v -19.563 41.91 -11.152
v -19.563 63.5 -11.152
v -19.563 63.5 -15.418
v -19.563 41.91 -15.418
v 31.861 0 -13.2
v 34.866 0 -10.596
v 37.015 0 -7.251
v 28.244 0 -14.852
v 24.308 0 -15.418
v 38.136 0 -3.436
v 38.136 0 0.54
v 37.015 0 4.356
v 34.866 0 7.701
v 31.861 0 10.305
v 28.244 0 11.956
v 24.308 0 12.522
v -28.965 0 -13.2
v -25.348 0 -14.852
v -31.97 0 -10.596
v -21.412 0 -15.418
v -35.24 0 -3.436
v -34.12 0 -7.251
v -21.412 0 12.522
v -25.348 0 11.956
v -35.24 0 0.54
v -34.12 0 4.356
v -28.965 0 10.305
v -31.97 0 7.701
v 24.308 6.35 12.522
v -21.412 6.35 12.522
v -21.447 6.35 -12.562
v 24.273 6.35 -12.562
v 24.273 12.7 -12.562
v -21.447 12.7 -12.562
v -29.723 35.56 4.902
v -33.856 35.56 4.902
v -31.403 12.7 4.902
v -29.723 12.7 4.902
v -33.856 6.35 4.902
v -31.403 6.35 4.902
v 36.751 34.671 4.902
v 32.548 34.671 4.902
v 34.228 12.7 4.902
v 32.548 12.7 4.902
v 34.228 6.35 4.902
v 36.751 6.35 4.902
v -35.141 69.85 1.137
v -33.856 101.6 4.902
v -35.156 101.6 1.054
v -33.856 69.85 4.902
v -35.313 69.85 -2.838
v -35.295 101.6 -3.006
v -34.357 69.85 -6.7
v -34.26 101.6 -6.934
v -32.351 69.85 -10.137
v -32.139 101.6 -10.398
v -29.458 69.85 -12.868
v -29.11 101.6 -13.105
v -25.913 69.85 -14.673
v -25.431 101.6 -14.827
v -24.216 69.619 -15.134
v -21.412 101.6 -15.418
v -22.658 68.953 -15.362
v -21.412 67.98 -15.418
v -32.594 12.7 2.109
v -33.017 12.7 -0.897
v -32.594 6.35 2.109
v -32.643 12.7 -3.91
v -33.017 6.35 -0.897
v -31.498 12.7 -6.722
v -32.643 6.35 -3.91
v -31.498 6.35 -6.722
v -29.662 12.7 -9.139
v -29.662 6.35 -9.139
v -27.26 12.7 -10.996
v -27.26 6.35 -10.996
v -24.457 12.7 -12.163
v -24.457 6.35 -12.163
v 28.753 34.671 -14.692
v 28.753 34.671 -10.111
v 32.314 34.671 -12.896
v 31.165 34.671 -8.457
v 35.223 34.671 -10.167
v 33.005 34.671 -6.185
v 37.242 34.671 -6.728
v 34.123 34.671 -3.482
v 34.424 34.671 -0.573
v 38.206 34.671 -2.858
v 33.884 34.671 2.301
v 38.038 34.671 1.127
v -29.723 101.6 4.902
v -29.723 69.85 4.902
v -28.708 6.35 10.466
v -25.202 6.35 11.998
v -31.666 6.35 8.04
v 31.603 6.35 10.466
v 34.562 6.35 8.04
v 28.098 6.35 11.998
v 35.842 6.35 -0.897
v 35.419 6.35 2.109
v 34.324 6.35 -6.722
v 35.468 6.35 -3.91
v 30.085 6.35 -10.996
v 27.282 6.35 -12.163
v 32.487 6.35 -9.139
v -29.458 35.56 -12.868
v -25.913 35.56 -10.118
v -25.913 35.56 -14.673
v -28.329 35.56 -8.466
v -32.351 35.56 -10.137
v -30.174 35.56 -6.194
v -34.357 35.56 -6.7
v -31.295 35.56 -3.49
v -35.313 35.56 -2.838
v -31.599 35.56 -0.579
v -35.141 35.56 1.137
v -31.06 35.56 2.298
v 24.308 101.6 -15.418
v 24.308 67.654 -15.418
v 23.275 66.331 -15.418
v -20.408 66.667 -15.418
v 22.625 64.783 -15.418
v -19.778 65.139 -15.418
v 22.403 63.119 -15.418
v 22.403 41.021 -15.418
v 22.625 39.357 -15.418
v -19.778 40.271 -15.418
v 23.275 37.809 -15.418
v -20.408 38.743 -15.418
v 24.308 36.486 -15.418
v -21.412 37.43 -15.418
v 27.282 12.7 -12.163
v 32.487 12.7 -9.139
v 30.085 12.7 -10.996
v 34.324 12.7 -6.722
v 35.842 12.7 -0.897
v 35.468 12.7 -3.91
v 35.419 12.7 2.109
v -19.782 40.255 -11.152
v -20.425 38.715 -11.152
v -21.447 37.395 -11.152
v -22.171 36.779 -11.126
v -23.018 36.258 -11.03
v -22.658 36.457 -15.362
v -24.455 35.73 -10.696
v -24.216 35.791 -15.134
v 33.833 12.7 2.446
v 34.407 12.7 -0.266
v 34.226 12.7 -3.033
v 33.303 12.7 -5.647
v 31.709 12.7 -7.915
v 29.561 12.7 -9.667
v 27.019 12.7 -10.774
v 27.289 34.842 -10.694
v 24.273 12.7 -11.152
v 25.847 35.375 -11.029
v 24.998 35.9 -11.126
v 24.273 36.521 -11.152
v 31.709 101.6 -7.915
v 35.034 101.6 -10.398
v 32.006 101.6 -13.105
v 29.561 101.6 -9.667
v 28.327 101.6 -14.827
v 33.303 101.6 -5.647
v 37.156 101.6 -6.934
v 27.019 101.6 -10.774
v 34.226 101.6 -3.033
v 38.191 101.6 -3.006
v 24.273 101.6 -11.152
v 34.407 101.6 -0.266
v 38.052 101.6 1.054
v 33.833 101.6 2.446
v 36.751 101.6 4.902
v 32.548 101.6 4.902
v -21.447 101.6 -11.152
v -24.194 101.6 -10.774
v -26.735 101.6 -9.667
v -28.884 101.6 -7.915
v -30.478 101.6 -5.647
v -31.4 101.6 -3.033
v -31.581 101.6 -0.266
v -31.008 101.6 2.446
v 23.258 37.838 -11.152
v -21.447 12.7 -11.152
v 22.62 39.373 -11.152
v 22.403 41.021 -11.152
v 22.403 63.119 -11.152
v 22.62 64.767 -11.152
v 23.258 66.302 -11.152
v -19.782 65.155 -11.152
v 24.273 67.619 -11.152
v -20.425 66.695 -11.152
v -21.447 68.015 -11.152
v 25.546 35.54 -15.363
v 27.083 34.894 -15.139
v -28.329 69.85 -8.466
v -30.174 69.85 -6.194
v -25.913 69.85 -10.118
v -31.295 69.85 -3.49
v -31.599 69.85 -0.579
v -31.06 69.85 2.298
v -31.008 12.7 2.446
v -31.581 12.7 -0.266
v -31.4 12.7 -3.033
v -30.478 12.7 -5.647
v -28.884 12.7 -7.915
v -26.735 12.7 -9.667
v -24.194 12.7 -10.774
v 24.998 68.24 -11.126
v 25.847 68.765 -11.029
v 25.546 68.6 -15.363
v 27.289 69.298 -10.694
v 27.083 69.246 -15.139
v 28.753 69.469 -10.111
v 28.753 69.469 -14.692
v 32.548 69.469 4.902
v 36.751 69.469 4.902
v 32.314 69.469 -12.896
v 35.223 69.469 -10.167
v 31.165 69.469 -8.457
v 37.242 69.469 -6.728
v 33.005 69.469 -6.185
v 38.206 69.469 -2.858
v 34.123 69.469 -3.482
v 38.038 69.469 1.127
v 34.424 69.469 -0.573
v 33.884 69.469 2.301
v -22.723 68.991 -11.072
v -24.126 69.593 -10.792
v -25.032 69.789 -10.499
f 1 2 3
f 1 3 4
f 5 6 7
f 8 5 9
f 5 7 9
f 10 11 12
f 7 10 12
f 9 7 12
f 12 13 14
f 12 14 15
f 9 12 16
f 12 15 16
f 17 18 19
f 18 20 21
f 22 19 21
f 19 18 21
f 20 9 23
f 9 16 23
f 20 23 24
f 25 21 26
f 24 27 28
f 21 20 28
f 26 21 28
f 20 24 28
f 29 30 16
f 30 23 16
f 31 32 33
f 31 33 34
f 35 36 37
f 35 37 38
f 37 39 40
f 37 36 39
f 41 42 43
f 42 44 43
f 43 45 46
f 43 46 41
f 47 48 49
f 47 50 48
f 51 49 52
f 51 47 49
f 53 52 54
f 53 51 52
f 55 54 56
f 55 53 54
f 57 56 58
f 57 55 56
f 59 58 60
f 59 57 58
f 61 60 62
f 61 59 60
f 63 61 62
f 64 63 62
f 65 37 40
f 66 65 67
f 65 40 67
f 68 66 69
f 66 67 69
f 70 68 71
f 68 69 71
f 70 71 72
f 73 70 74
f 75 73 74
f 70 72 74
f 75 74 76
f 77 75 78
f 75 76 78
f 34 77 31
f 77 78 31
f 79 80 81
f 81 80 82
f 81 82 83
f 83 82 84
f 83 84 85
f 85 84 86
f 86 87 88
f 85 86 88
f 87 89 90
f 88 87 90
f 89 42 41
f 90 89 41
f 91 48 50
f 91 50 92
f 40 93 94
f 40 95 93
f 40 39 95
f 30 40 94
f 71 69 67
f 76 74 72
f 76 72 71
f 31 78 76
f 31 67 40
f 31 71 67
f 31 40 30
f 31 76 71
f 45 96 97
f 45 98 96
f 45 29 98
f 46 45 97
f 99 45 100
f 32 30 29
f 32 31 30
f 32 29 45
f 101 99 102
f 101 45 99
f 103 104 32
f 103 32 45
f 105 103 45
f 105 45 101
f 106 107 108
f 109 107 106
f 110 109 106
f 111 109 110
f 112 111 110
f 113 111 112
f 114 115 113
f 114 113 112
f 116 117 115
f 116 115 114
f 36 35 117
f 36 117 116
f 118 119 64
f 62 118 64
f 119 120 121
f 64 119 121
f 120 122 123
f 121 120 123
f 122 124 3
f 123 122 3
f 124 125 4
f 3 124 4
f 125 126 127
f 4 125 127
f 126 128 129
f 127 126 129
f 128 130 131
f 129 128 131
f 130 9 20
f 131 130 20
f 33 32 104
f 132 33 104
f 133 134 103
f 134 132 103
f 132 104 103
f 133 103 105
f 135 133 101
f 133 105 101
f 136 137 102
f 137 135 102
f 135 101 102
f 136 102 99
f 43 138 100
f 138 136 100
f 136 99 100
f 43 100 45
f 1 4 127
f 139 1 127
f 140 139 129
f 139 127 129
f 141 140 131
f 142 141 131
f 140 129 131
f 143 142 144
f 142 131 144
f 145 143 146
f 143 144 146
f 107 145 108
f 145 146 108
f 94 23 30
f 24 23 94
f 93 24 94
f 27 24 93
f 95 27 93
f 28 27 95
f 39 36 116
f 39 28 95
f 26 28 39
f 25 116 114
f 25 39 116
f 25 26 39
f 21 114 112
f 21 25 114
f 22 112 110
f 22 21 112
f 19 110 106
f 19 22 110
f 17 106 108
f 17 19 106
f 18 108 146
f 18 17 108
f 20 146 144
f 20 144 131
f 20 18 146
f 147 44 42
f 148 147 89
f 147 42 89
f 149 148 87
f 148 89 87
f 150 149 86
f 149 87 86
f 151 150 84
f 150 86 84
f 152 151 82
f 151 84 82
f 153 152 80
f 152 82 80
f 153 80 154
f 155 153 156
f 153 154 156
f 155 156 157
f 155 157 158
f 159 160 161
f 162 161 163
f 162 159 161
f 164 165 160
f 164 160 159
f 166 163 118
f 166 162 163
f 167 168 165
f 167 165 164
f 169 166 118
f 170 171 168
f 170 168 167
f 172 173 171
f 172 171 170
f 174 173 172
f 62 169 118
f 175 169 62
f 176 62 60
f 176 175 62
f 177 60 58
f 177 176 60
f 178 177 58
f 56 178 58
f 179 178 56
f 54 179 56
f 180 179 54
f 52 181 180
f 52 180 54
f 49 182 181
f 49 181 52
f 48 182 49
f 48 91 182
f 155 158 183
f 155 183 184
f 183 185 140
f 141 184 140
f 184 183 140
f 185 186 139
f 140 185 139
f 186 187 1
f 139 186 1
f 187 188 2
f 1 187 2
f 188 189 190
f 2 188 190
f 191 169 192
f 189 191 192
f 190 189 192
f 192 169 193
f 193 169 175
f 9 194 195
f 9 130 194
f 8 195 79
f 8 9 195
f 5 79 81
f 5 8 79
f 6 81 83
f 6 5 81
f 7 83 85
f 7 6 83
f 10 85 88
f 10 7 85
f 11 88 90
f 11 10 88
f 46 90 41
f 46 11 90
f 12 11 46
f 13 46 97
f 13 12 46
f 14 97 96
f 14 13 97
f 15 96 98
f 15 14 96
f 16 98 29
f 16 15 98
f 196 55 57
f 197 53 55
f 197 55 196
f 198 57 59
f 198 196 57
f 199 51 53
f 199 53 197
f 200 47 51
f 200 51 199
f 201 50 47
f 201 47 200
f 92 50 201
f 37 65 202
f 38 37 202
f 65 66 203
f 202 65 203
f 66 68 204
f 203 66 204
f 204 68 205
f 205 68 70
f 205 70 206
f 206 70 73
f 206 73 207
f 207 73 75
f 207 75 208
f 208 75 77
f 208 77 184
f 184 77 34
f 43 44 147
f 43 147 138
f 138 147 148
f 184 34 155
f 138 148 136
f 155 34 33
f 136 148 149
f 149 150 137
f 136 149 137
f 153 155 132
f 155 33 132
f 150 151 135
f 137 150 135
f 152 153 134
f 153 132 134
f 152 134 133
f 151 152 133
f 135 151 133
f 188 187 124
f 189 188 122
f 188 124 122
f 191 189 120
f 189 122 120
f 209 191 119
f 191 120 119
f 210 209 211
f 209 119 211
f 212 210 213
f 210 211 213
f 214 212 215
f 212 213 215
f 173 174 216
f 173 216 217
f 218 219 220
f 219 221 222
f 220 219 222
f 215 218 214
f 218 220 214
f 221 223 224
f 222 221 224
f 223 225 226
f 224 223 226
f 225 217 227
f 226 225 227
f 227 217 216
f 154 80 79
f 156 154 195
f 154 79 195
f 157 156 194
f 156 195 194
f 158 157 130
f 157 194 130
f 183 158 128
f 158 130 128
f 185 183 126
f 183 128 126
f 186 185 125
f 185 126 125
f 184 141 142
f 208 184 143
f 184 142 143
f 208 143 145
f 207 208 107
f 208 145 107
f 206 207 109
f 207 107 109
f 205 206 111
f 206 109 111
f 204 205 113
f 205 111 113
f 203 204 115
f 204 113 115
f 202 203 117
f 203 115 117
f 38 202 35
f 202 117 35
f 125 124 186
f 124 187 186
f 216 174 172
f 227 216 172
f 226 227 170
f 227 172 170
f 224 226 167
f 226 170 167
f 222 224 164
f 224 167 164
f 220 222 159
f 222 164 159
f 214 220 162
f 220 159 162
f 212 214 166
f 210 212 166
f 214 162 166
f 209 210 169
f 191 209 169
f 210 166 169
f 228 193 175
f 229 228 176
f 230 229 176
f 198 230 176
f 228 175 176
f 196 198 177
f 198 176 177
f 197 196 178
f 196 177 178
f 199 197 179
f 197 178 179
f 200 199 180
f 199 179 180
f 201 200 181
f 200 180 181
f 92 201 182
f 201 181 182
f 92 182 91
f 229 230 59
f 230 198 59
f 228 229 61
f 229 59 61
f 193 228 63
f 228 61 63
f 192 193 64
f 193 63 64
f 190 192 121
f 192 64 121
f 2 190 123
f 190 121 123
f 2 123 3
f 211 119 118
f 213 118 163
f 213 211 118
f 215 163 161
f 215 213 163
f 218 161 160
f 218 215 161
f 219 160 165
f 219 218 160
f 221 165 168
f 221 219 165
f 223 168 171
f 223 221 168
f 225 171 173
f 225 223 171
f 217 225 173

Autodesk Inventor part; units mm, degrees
ref_plane "YZ Plane" through (0, 0, 0) normal (1, 0, 0) x (0, 1, 0)
sketch "Sketch1" plane through (0, 0, 0) normal (0, 1, 0) x (-1, 0, 0)
  line L0 (-24.3078, -15.4178) -> (21.4122, -15.4178)
  line L1 (21.4122, 12.5222) -> (-24.3078, 12.5222)
  arc A0 (21.4122, -15.4178) -> (21.4122, 12.5222) centre (21.4122, -1.4478) ccw
  arc A1 (-24.3078, 12.5222) -> (-24.3078, -15.4178) centre (-24.3078, -1.4478) ccw
  point P0 (0, 0)
  dimension "d2" = 27.94
  dimension "d3" = 45.72
extrude "Extrusion1" add sketch "Sketch1" along normal blind 101.6
sketch "Sketch2" plane through (0, 101.6, 0) normal (0, 1, 0) x (1, 0, 0)
  line L0 (24.2727, 11.1519) -> (-21.4473, 11.1519)
  line L1 (-21.4473, -9.1681) -> (24.2727, -9.1681)
  arc A0 (-21.4473, 11.1519) -> (-21.4473, -9.1681) centre (-21.4473, 0.9919) ccw
  arc A1 (24.2727, -9.1681) -> (24.2727, 11.1519) centre (24.2727, 0.9919) ccw
  arc A2 (-21.4122, 15.4178) -> (-21.4122, -12.5222) centre (-21.4122, 1.4478) ccw projected
  point P0 (0, 0)
  dimension "d7" = 20.32
  dimension "d8" = 45.72
extrude "Extrusion2" cut sketch "Sketch2" against normal blind 95.25
sketch "Sketch3" plane through (0, 6.35, 0) normal (0, 1, 0) x (1, 0, 0)
  arc A0 (-21.4122, 15.4178) -> (-21.4122, -12.5222) centre (-21.4122, 1.4478) ccw projected
  line L0 (-33.8556, -4.9022) -> (40.6958, -4.9022)
  line L1 (40.6958, -4.9022) -> (40.6958, -12.5222)
  line L2 (40.6958, -12.5222) -> (-33.8556, -12.5222)
  line L3 (-33.8556, -12.5222) -> (-33.8556, -4.9022)
  line L4 (-21.4122, -12.5222) -> (24.3078, -12.5222) projected
  point P0 (0, 0)
  dimension "d13" = 7.62
  dimension "d14" = 0
extrude "Extrusion3" cut sketch "Sketch3" along normal blind 95.25
fillet "Fillet1" [suppressed]
ref_plane "Work Plane1" through (-21.4473, 101.6, -11.1519) normal (-1, 0, 0) x (0, -1, 0)
ref_plane "Work Plane2" through (24.2727, 101.6, -11.1519) normal (-1, 0, 0) x (0, -1, 0)
sketch "Sketch6" plane through (24.2727, 101.6, -11.1519) normal (-1, 0, 0) x (0, -1, 0)
  line L0 (66.929, 0.4433) -> (32.131, 0.4433)
  line L1 (32.131, 0.4433) -> (32.131, 26.3545)
  line L2 (32.131, 26.3545) -> (66.929, 26.3545)
  line L3 (66.929, 26.3545) -> (66.929, 0.4433)
  line L4 (95.25, 16.0541) -> (95.25, 23.6741) projected
  point P0 (101.6, 11.1519)
  point P1 (95.25, 16.0541)
  dimension "d30" = 34.798
  dimension "d31" = 28.321
extrude "Extrusion6" cut sketch "Sketch6" against normal up to next
sketch "Sketch7" plane through (-21.4473, 101.6, -11.1519) normal (-1, 0, 0) x (0, -1, 0)
  line L0 (31.75, 1.1631) -> (66.04, 1.1631)
  line L1 (66.04, 1.1631) -> (66.04, 21.3162)
  line L2 (66.04, 21.3162) -> (31.75, 21.3162)
  line L3 (31.75, 21.3162) -> (31.75, 1.1631)
  line L4 (95.25, 16.0541) -> (95.25, 23.6741) projected
  point P0 (101.6, 11.1519)
  dimension "d35" = 34.29
  dimension "d36" = 29.21
extrude "Extrusion7" cut sketch "Sketch7" along normal blind 25.4
sketch "Sketch10" plane through (-21.4473, 101.6, -11.1519) normal (0, 0, 1) x (1, 0, 0)
  line L0 (-13.9903, -31.75) -> (1.8847, -31.75)
  line L1 (1.8847, -31.75) -> (1.8847, -66.04)
  line L2 (1.8847, -66.04) -> (-13.9903, -66.04)
  line L3 (-13.9903, -66.04) -> (-13.9903, -31.75)
  line L4 (59.7251, -101.6) -> (59.7251, 0) projected
  line L5 (59.7251, -32.131) -> (43.8501, -32.131)
  line L6 (43.8501, -32.131) -> (43.8501, -66.929)
  line L7 (43.8501, -66.929) -> (59.7251, -66.929)
  line L8 (59.7251, -66.929) -> (59.7251, -32.131)
  line L9 (53.9955, -32.131) -> (58.1985, -32.131) projected
  point P0 (21.4473, -101.6)
  point P1 (55.1473, -32.131)
  dimension "d58" = 15.875
  dimension "d59" = 34.29
  dimension "d60" = 15.875
  dimension "d61" = 34.798
  dimension "d62" = 0
extrude "Extrusion10" cut sketch "Sketch10" against normal through all both and the other way through all
fillet "Fillet6" radius 6.35 4 edges at (22.4028, 69.469, -13.2849) (22.4028, 34.671, -13.2849) (-19.5625, 69.85, -13.2849) (-19.5625, 35.56, -13.2849)
sketch "Sketch11" plane through (0, 6.35, 0) normal (0, 1, 0) x (1, 0, 0)
  arc A0 (32.5483, -4.9022) -> (24.2727, 11.1519) centre (24.2727, 0.9919) ccw projected
  arc A1 (24.2727, -10.5778) -> (24.2727, 12.5616) centre (24.2727, 0.9919) ccw
  arc A2 (-21.4473, 11.1519) -> (-29.7228, -4.9022) centre (-21.4473, 0.9919) ccw projected
  arc A3 (-21.4473, 12.5616) -> (-20.3359, -10.5243) centre (-21.4473, 0.9919) ccw
  line L0 (24.2727, 12.5616) -> (-24.2727, 12.5616)
  line L1 (-20.4393, -10.5778) -> (24.2727, 12.5616) construction
  line L2 (20.4393, -10.5778) -> (-24.2727, 12.5616) construction
  line L3 (24.2727, -10.5778) -> (-21.4473, -10.5778)
  line L4 (-24.2727, 12.5616) -> (-24.2727, 10.7512)
  line L5 (24.2727, 0.9919) -> (24.2727, 12.5616)
  point P0 (0, 0)
  point P1 (33.1455, -3.9578)
  point P2 (-30.32, -3.9578)
  dimension "d66" = 23.1394
  dimension "d67" = 23.1394
extrude "Extrusion11" cut sketch "Sketch11" along normal blind 6.35 contours L3 A3 L0 A1
properties part number "Proto-Valve Holder"
